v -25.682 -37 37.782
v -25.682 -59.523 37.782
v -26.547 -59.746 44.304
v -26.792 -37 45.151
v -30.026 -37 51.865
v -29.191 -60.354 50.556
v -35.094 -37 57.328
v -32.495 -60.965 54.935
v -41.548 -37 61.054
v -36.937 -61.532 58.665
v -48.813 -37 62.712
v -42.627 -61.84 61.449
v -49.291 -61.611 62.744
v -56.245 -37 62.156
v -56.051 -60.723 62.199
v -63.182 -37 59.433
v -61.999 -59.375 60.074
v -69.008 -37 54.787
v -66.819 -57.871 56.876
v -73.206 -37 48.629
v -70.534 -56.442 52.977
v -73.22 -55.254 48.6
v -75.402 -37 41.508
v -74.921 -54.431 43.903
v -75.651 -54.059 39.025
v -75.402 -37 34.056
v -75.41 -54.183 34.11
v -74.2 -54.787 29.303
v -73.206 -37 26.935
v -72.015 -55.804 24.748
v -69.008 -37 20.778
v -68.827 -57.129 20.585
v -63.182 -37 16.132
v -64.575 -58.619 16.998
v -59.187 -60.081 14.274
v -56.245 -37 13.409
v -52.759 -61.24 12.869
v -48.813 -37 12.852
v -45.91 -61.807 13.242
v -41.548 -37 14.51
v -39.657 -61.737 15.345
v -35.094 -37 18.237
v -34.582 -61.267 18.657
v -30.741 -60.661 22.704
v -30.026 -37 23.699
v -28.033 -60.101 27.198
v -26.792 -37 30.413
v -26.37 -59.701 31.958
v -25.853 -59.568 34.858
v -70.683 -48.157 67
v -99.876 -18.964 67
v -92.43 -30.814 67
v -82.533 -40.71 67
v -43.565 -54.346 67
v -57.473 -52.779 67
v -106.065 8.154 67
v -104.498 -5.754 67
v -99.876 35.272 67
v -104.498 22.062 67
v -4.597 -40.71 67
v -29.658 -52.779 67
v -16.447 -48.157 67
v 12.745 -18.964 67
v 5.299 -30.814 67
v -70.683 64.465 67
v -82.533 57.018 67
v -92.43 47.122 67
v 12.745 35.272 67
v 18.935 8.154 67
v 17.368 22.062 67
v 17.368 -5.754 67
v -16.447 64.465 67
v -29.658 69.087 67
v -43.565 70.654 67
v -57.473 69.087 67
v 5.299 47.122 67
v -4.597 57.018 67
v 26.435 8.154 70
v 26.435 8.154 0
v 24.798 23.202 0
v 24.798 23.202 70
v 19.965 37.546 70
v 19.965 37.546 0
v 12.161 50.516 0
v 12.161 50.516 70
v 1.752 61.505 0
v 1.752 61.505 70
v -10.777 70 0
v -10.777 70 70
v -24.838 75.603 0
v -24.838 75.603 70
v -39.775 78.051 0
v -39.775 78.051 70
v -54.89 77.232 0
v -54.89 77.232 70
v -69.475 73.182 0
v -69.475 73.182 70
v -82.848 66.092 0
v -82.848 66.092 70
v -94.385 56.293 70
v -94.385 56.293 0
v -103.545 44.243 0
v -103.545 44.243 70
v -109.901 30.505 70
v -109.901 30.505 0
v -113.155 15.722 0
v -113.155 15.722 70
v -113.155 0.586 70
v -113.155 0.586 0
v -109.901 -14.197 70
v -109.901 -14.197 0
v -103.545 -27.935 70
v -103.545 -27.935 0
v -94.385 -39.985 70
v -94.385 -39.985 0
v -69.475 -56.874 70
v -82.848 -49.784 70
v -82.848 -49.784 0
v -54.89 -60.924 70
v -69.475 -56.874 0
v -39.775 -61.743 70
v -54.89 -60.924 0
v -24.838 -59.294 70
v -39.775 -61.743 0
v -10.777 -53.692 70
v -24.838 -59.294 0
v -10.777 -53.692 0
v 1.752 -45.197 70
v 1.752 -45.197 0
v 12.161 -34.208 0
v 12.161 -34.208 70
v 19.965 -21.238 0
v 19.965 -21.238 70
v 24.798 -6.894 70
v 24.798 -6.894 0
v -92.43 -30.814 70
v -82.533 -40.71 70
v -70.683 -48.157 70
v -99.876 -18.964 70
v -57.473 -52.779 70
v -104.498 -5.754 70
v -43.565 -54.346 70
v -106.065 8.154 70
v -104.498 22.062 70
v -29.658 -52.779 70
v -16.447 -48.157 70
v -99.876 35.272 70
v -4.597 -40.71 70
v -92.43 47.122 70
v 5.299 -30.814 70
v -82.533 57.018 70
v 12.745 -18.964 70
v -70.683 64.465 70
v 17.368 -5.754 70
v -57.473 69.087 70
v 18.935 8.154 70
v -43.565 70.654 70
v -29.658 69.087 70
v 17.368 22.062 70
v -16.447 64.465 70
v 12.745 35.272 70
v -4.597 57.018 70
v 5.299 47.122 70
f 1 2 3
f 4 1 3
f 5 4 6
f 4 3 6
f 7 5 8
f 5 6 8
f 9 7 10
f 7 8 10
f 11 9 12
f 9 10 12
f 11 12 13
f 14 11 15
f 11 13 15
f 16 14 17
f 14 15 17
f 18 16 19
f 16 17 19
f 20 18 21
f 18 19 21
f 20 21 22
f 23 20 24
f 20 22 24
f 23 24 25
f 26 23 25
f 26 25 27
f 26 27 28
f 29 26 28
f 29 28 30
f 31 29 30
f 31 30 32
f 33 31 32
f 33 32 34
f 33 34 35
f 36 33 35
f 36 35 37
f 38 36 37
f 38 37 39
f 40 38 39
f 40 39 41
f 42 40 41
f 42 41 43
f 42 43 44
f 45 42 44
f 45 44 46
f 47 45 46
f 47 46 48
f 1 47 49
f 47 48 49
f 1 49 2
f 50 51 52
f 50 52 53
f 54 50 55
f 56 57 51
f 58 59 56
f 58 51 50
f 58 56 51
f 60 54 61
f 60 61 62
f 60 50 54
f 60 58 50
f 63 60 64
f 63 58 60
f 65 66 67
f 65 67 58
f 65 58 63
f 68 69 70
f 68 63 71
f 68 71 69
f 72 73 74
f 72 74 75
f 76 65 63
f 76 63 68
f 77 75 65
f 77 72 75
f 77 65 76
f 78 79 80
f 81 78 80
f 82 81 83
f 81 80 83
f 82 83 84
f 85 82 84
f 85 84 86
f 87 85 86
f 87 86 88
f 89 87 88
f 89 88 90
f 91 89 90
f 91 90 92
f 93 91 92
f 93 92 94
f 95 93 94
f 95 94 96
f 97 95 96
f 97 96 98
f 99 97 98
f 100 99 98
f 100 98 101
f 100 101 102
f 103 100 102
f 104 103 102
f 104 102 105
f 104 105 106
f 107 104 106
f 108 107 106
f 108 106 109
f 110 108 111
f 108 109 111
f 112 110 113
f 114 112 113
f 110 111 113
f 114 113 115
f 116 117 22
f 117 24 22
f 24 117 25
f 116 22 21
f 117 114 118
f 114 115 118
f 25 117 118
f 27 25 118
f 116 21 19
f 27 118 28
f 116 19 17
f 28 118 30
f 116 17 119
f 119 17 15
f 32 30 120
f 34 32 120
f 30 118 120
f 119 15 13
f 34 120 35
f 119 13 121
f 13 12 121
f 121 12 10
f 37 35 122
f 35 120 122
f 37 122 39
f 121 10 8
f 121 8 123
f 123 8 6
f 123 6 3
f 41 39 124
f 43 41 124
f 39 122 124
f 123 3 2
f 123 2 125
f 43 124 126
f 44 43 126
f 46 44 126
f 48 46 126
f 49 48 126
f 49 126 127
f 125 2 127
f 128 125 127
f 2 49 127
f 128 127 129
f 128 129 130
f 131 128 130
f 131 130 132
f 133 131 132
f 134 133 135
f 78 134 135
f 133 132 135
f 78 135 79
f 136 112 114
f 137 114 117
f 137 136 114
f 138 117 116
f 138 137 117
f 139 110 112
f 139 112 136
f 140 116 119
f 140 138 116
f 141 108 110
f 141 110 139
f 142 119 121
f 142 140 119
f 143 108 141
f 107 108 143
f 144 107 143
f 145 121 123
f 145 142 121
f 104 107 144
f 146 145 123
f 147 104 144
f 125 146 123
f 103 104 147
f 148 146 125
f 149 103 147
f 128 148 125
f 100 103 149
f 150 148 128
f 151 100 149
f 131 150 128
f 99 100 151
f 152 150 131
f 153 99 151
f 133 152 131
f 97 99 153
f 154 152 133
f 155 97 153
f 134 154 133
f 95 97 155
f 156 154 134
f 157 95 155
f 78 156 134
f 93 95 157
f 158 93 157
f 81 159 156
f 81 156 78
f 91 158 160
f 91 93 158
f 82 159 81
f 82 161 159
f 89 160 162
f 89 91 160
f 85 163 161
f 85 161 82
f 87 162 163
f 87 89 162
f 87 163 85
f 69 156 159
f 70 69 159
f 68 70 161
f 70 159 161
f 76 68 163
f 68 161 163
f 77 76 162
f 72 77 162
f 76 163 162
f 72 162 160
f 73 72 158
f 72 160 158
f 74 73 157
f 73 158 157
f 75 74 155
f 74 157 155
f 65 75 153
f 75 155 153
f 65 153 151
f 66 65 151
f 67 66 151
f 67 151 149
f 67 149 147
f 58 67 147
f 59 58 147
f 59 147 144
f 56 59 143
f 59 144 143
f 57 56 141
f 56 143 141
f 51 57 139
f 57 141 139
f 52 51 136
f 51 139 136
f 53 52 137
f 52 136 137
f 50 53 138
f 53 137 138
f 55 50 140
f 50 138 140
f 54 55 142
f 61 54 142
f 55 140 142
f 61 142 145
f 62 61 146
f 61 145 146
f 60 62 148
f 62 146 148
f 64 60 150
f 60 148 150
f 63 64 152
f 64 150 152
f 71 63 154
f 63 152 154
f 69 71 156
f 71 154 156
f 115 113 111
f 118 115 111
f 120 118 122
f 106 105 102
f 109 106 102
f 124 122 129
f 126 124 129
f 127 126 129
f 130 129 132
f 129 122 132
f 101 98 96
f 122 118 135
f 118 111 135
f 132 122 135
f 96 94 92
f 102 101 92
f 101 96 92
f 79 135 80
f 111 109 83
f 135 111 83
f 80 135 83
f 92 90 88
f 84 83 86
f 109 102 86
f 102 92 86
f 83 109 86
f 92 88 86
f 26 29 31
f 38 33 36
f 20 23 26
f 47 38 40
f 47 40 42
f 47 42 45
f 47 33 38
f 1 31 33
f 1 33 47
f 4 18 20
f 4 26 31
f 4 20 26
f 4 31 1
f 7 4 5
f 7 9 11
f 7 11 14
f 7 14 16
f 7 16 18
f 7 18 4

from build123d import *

# Parameters (mm, degrees)
F0_R     = 70
F1_DEPTH = 70
F3_R     = 25
F4_DEPTH = 25
F5_R     = 62.5
F6_DEPTH = 3


with BuildPart() as f1:
    # F0 (on Top) → F1 (new body)
    with BuildSketch(Plane.XY):
        with Locations((-43.56515, 8.154014)):
            Circle(F0_R)
    extrude(amount=F1_DEPTH)

    # F3 (on offset) → F4 (cut)
    with BuildSketch(Plane.XZ.offset(62)):
        with Locations((-50.681688, 37.782334)):
            Circle(F3_R)
    extrude(amount=-F4_DEPTH, mode=Mode.SUBTRACT)

    # F5 (on face) → F6 (cut)
    with BuildSketch(Plane.XY.offset(70)):
        with Locations((-43.56515, 8.154014)):
            Circle(F5_R)
    extrude(amount=-F6_DEPTH, mode=Mode.SUBTRACT)


solid = f1.part
